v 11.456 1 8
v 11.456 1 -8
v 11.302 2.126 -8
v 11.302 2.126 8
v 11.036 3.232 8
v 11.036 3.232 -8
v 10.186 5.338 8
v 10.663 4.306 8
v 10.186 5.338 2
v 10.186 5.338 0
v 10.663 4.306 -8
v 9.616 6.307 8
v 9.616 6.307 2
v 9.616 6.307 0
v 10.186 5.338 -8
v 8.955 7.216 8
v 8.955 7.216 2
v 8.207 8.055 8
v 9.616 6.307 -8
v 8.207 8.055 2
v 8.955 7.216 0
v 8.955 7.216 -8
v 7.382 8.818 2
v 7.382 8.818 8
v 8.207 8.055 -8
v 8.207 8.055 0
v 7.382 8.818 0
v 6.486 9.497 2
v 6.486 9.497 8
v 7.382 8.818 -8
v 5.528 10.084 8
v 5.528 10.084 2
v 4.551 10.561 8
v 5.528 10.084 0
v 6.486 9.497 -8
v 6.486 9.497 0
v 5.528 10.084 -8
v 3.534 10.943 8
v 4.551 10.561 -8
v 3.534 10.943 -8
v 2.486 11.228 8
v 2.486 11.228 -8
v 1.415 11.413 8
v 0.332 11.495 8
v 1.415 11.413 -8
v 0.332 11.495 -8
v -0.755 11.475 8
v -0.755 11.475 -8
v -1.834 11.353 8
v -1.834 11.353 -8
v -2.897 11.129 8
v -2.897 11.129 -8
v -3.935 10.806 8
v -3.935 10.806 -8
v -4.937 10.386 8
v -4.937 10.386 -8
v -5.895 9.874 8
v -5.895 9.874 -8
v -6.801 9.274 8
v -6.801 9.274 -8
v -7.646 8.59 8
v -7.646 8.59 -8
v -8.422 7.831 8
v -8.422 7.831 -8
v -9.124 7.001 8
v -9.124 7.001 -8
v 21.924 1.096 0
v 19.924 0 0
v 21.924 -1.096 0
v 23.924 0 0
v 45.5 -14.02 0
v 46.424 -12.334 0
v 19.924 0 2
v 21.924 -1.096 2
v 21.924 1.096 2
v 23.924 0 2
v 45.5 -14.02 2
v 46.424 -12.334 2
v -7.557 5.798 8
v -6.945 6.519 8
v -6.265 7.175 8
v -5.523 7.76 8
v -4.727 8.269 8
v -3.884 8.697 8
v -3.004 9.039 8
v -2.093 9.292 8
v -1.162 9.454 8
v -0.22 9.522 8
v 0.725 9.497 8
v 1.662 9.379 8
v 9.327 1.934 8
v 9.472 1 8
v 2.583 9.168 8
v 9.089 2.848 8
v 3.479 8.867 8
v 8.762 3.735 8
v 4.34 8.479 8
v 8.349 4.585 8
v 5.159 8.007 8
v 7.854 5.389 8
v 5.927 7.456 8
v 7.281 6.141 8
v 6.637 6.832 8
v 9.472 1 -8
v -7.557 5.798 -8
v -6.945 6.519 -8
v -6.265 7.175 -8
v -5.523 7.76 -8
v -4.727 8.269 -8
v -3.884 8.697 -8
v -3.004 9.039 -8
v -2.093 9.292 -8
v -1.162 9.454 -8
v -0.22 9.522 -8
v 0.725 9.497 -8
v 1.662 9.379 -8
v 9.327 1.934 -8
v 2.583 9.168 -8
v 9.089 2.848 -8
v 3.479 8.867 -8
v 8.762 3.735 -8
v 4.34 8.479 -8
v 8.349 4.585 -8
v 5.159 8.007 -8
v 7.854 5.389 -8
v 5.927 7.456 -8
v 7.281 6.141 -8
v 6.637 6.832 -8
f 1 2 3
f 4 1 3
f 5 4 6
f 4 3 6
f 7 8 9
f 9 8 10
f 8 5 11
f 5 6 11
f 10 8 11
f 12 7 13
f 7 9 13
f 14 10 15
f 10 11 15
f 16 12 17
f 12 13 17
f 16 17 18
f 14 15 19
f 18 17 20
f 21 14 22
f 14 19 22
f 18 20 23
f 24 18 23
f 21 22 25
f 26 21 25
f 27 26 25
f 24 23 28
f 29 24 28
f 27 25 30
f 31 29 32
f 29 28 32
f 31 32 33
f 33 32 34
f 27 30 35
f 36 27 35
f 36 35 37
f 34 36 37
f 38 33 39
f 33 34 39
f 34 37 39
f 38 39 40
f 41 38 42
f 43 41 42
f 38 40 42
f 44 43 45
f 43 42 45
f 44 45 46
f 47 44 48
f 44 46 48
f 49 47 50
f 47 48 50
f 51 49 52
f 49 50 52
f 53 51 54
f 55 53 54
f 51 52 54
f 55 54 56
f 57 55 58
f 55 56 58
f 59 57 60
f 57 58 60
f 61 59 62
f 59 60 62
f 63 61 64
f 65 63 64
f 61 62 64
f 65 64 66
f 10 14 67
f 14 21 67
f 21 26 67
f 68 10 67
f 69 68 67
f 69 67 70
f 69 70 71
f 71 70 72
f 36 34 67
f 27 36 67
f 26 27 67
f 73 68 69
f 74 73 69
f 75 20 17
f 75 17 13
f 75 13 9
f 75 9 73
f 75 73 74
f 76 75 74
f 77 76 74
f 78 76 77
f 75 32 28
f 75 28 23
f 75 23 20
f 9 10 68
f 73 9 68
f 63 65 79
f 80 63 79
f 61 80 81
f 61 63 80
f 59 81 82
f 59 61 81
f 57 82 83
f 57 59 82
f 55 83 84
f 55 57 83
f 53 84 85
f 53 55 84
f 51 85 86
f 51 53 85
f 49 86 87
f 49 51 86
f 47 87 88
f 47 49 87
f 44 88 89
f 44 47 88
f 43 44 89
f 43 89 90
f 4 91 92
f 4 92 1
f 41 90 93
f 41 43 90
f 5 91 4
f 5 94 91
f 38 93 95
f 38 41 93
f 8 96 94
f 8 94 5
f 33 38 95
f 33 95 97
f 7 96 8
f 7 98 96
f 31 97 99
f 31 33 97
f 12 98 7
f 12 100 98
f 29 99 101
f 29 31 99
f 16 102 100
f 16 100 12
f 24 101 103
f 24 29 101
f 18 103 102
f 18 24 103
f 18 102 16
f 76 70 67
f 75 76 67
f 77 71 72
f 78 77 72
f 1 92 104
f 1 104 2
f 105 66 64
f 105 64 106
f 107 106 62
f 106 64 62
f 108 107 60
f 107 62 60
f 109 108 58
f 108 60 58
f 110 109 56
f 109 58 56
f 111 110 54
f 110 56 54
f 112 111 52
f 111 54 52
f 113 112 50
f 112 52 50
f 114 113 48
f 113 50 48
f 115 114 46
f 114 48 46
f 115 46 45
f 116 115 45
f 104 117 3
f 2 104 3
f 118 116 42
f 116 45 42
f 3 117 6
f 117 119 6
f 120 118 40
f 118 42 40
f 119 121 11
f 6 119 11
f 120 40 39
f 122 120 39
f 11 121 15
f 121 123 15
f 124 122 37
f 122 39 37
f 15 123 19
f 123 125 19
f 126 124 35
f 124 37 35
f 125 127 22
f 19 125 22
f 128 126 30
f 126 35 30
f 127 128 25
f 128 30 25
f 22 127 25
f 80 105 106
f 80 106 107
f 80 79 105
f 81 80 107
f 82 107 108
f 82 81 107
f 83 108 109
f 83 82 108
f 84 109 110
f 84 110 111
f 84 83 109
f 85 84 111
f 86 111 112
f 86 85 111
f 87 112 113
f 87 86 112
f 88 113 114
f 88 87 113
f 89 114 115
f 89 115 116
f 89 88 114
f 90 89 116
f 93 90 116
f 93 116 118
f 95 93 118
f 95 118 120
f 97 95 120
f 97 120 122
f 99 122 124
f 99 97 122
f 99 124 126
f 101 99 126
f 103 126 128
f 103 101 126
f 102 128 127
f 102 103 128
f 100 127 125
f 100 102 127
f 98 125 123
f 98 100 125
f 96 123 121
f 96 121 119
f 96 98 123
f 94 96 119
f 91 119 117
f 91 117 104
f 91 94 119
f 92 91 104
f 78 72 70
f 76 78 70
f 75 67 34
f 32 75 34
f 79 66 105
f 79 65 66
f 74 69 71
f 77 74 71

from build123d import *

# Parameters (mm, degrees)
F1_DEPTH = 8
F2_DEPTH = 2


with BuildPart() as f1:
    # F0 (on Top) → F1 (new body, symmetric)
    with BuildSketch(Plane.XY):
        with BuildLine():
            ThreePointArc((-7.5566905663, 5.7984526113), (2.5833573647, 9.1679817695), (9.4723611101, 1))
            Line((9.4723611101, 1), (11.4564392374, 1))
            ThreePointArc((11.4564392374, 1), (11.0364450387, 3.2321635028), (10.1859294227, 5.3382433249))
            ThreePointArc((10.1859294227, 5.3382433249), (8.2074300514, 8.055314516), (5.5278432783, 10.084292176))
            ThreePointArc((5.5278432783, 10.084292176), (-2.3684064244, 11.2534728421), (-9.1235634133, 7.0007564336))
            Line((-9.1235634133, 7.0007564336), (-7.5566905663, 5.7984526113))
        make_face()
    extrude(amount=F1_DEPTH, both=True)

    # F0 (on Top) → F2 (join)
    with BuildSketch(Plane.XY):
        with BuildLine():
            ThreePointArc((5.5278432783, 10.084292176), (8.2074300514, 8.055314516), (10.1859294227, 5.3382433249))
            Line((10.1859294227, 5.3382433249), (19.924339628, 0))
            Line((19.924339628, 0), (21.924339628, 1.0963274728))
            Line((21.924339628, 1.0963274728), (5.5278432783, 10.084292176))
        make_face()
        Polygon((21.924339628, 1.0963274728), (19.924339628, 0), (21.924339628, -1.0963274728), (23.924339628, 0), align=None)
        Polygon((23.924339628, 0), (21.924339628, -1.0963274728), (45.4999829336, -14.0196401956), (46.4242037672, -12.3336095953), align=None)
    extrude(amount=F2_DEPTH)


solid = f1.part
